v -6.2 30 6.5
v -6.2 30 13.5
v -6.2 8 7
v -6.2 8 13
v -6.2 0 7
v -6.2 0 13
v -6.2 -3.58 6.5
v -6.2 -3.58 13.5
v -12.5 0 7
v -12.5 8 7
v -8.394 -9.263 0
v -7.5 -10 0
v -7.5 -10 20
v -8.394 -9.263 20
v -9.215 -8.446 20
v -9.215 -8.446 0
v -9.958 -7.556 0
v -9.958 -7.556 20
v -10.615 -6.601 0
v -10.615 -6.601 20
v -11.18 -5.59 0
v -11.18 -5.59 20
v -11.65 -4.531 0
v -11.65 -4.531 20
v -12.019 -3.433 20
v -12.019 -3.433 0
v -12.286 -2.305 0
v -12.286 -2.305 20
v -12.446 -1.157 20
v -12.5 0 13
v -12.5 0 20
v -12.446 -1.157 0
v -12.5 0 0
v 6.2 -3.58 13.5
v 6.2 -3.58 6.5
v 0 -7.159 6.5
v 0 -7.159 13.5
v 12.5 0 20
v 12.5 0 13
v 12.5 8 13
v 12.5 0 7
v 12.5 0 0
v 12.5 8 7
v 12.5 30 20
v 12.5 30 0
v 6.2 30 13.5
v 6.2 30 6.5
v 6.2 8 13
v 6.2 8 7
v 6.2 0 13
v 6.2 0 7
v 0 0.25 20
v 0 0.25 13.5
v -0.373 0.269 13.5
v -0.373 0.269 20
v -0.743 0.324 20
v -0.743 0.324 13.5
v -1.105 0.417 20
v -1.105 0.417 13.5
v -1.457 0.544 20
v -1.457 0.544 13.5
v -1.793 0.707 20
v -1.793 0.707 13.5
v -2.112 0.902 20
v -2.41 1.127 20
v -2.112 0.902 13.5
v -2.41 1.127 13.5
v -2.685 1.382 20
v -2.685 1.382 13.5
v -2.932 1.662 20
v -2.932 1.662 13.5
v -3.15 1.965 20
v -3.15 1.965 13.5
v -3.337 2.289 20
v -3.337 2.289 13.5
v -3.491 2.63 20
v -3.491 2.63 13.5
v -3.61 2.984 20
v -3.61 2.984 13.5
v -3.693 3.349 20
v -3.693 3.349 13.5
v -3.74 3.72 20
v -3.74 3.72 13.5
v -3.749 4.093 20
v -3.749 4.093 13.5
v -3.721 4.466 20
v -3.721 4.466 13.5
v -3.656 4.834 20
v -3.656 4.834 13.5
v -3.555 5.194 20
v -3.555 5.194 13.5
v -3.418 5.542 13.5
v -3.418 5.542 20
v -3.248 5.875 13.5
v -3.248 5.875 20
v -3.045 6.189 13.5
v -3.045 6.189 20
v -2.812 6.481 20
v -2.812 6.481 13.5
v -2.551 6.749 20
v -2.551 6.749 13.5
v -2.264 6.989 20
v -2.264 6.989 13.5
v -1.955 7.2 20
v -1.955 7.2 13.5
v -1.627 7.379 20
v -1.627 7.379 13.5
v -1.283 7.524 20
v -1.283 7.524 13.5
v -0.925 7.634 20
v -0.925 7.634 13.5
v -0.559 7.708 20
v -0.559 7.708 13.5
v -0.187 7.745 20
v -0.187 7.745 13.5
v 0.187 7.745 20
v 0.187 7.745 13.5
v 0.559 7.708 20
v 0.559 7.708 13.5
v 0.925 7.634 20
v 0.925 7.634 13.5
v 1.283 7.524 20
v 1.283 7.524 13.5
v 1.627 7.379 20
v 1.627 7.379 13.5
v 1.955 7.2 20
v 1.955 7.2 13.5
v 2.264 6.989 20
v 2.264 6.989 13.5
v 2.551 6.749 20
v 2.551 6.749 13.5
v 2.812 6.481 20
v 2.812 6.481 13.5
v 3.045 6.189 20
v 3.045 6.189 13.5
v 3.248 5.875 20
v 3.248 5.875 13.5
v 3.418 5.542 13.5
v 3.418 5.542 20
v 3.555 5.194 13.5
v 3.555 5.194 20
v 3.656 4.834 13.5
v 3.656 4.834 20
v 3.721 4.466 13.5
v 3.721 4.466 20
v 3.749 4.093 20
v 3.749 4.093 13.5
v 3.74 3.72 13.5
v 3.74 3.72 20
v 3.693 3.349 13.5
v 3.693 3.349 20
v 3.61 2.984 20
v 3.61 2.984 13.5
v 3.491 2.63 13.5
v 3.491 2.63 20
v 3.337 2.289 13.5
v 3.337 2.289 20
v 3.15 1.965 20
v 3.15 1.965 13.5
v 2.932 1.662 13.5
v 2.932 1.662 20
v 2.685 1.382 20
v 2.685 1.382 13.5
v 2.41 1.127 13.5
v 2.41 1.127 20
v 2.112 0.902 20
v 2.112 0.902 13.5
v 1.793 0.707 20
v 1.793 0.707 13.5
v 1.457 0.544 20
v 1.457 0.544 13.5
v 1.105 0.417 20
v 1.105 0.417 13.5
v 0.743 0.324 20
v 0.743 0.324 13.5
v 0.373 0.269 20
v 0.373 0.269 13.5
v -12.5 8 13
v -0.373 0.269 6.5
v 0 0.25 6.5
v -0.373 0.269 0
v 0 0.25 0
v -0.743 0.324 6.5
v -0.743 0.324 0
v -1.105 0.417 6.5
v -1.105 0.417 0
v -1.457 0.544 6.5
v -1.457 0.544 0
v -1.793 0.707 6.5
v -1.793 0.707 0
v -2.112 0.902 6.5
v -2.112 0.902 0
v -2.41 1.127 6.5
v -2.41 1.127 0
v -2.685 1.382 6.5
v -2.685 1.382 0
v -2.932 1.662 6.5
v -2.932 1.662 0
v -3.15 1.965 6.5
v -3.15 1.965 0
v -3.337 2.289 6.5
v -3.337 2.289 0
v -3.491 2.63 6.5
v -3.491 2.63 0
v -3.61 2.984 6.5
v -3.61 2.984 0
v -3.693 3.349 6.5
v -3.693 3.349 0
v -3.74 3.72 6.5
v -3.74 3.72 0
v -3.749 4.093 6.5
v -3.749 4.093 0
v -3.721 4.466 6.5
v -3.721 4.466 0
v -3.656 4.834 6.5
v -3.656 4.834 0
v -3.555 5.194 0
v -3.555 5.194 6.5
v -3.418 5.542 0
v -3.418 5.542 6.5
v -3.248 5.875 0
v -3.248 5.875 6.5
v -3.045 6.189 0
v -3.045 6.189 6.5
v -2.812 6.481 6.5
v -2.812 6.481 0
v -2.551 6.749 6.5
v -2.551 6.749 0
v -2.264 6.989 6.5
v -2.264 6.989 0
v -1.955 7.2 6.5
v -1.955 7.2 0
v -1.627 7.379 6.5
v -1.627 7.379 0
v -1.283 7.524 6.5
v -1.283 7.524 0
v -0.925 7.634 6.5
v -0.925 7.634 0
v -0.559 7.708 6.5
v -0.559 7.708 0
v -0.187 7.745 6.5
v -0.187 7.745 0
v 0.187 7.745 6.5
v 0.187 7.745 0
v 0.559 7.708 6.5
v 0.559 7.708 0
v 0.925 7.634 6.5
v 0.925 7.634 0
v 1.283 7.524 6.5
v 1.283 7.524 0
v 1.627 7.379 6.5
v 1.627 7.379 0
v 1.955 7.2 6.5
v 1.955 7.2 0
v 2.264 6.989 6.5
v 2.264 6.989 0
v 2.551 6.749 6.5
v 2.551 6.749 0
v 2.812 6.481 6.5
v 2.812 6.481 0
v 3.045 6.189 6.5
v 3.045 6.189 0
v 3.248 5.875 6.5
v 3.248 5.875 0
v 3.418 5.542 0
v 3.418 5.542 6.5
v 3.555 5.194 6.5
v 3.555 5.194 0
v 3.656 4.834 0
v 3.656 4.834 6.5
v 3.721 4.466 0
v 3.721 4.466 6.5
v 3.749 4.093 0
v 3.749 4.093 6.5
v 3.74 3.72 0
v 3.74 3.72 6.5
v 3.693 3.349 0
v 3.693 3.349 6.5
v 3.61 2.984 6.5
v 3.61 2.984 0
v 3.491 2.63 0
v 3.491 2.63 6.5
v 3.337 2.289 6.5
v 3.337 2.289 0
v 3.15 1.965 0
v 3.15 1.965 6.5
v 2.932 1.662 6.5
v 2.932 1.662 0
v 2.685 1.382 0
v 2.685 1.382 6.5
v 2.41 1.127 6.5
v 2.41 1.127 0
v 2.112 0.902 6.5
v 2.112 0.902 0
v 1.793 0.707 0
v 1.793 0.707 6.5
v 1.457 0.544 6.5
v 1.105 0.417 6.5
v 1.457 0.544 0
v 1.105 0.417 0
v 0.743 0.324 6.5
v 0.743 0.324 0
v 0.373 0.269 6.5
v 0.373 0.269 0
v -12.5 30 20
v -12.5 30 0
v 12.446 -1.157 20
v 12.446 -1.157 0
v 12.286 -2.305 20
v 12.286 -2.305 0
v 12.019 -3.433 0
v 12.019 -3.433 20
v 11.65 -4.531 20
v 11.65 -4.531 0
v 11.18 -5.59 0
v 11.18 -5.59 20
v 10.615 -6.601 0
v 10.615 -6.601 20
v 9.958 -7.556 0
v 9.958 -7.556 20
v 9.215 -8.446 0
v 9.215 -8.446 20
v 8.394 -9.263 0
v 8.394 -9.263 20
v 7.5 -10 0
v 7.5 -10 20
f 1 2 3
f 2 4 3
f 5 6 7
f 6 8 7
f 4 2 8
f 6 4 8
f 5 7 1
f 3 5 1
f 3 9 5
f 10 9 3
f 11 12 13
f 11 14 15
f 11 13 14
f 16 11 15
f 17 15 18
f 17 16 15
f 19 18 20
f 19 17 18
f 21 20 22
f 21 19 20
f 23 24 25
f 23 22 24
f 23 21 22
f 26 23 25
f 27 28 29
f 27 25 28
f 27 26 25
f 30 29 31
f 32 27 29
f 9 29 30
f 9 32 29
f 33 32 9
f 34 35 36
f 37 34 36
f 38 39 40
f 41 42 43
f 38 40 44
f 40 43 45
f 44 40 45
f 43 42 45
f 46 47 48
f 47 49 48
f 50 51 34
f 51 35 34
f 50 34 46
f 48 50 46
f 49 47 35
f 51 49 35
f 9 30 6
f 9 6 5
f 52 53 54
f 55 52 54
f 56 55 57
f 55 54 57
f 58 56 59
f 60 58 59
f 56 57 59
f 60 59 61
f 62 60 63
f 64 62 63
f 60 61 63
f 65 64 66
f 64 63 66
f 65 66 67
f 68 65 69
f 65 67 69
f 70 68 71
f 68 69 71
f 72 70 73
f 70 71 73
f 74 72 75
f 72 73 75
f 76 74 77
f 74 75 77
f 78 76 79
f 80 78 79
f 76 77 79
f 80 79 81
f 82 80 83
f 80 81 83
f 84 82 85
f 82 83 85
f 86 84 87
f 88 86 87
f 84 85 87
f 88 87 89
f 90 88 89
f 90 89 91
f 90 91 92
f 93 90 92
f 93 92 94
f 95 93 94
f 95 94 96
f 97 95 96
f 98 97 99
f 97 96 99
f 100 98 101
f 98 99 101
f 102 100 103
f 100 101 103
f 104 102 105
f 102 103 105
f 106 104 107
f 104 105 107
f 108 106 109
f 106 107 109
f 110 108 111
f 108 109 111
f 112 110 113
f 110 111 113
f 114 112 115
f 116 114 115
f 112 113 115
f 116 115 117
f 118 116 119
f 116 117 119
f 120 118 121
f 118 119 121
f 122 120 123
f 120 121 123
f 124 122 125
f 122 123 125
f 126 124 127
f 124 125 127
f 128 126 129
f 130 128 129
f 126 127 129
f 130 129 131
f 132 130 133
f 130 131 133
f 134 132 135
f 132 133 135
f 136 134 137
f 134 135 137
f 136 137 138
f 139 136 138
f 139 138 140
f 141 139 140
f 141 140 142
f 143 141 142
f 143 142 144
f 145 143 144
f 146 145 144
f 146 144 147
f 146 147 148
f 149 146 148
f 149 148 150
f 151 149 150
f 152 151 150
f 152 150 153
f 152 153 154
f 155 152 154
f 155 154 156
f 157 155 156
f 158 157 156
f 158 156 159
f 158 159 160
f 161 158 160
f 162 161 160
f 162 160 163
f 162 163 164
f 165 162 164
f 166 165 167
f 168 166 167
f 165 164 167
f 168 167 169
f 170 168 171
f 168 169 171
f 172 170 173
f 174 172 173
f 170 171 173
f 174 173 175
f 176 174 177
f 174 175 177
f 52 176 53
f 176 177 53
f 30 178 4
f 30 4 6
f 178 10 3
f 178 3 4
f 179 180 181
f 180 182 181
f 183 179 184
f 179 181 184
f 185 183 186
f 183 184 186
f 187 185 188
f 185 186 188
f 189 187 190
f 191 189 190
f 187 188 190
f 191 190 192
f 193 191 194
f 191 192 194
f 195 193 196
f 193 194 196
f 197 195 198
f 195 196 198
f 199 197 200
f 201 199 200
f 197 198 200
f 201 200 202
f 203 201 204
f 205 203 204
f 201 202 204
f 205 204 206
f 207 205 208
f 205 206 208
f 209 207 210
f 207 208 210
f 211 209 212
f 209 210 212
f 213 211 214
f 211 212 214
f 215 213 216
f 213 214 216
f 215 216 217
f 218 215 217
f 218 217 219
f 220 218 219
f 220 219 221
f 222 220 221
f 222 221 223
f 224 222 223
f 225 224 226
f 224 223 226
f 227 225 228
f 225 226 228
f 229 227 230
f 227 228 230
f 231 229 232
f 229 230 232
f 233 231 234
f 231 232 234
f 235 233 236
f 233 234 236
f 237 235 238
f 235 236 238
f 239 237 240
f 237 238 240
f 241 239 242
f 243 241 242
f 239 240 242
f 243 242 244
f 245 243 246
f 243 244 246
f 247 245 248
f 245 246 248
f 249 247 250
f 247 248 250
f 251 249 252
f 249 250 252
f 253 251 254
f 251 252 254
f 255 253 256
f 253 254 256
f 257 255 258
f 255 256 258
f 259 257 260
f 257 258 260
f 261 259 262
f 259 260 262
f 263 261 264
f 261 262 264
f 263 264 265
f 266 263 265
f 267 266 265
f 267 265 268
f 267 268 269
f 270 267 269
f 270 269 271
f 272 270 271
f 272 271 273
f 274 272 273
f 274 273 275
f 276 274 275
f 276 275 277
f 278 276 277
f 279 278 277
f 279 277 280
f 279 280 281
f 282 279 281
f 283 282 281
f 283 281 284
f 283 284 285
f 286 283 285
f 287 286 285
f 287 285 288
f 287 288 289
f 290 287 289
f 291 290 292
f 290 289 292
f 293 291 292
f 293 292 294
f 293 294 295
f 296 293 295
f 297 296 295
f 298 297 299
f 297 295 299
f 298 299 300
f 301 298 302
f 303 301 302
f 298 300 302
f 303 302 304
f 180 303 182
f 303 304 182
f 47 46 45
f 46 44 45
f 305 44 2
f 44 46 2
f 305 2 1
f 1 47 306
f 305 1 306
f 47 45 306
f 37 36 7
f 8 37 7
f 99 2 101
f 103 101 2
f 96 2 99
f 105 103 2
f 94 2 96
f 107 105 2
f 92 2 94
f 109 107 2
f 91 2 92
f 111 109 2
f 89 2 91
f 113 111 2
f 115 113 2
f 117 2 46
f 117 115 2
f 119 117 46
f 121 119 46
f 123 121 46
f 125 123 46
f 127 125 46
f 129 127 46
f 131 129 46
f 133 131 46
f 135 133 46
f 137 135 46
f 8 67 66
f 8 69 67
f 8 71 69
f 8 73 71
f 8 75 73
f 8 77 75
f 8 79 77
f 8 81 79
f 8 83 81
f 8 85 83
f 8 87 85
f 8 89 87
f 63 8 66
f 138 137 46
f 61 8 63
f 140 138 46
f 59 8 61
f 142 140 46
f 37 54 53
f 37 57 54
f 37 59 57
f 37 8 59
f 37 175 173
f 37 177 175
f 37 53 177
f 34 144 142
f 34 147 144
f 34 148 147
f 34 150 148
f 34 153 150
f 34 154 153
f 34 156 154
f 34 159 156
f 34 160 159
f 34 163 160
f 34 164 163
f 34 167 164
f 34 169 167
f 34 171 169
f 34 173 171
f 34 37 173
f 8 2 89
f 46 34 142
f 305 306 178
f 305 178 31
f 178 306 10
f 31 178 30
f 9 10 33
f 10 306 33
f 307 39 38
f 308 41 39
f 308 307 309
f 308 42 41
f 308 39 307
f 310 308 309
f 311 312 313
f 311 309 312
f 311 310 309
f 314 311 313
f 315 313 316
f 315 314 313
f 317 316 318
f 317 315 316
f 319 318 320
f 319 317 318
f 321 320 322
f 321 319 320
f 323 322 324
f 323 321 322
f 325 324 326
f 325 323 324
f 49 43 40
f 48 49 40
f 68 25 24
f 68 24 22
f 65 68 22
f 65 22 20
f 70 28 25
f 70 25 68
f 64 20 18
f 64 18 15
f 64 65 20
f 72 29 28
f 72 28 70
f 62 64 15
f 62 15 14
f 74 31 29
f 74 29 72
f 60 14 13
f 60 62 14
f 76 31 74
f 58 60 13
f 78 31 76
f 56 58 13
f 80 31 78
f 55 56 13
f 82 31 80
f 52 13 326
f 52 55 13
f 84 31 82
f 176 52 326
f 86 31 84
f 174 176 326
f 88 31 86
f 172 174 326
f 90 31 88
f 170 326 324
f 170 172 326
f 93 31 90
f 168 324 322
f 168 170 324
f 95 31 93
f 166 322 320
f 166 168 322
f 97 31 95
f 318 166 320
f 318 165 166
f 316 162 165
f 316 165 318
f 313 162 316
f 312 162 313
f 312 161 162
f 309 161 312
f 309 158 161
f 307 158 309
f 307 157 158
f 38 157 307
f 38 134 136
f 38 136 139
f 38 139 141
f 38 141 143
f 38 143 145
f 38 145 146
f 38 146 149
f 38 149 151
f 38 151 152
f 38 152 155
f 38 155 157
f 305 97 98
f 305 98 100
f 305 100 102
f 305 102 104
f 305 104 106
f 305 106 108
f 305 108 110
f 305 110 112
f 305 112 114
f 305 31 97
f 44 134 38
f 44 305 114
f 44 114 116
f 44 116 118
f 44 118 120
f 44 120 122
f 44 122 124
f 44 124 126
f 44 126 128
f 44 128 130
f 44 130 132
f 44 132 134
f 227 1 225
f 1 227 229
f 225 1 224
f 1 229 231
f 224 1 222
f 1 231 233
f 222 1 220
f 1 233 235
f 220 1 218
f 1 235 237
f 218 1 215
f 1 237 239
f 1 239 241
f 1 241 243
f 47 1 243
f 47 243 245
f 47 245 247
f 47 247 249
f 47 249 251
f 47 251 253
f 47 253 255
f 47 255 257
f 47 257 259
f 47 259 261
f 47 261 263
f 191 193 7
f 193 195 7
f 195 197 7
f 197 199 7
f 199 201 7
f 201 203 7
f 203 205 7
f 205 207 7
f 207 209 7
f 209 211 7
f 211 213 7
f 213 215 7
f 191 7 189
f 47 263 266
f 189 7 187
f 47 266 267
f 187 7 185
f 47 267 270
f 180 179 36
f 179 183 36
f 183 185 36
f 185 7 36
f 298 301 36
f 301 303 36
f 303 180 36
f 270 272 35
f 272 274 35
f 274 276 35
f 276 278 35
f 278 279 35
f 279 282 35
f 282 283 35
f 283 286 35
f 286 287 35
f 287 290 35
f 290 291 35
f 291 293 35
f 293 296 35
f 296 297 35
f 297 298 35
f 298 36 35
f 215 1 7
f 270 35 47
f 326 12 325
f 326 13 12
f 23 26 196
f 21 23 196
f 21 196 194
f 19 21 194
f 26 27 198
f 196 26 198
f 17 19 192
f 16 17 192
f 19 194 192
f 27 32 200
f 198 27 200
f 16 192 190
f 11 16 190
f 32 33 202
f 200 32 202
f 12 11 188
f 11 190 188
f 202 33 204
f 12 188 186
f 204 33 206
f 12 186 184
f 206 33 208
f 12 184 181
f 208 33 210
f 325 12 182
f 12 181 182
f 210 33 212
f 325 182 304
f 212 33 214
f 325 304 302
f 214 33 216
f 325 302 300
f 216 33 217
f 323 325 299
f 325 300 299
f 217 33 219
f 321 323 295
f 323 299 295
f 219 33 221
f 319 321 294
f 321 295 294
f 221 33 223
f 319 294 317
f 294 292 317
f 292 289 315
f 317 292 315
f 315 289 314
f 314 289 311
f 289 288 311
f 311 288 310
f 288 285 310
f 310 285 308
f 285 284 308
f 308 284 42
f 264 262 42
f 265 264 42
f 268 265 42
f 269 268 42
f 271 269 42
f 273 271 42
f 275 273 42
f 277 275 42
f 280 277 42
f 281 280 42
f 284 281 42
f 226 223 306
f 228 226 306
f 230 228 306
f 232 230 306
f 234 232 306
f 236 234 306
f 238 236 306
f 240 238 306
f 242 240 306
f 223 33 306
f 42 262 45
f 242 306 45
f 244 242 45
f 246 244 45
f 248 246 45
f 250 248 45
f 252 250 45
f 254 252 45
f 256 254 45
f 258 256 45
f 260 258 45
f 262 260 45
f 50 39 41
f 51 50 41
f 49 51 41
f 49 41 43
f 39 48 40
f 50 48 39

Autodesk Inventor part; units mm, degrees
ref_plane "YZ Plane" through (0, 0, 0) normal (1, 0, 0) x (0, 1, 0)
ref_plane "XZ Plane" through (0, 0, 0) normal (0, 1, 0) x (-1, 0, 0)
sketch "Sketch1" plane through (0, 0, 0) normal (0, 0, 1) x (1, 0, 0)
  line L0 (12.5, 0) -> (12.5, 30)
  line L1 (12.5, 30) -> (-12.5, 30)
  line L2 (-12.5, 30) -> (-12.5, 0)
  arc A0 (-12.5, 0) -> (12.5, 0) centre (0, 0) ccw
  point P0 (0, 30)
  dimension "d0" = 25
  dimension "d1" = 30
  dimension "d2" = 30
  dimension "d3" = 12.5
  dimension "d4" = 12.5
  dimension "d5" = 12.5
extrude "Extrusion1" add sketch "Sketch1" along normal blind 20
ref_plane "Work Plane1" through (0, 0, 10) normal (0, 0, 1) x (1, 0, 0)
sketch "Sketch2" plane through (0, 0, 10) normal (0, 0, 1) x (1, 0, 0)
  line L0 (6.2, 3.5796) -> (6.2, -3.5796)
  line L1 (6.2, -3.5796) -> (0, -7.1591)
  line L2 (0, -7.1591) -> (-6.2, -3.5796)
  line L3 (-6.2, -3.5796) -> (-6.2, 3.5796)
  line L4 (-6.2, 3.5796) -> (0, 7.1591)
  line L5 (0, 7.1591) -> (6.2, 3.5796)
  line L6 (12.5, 30) -> (12.5, 0) projected
  line L7 (-12.5, 0) -> (-12.5, 30) projected
  line L8 (-12.5, 30) -> (12.5, 30) projected
  line L9 (12.5, 30) -> (12.5, 0) projected
  arc A0 (-12.5, 0) -> (12.5, 0) centre (0, 0) ccw projected
  dimension "d9" = 12.4
extrude "Extrusion2" cut sketch "Sketch2" along normal mid plane 7 contours L0 L1 L2 L3 L4 L5
sketch "Sketch3" plane through (0, 0, 0) normal (0, 1, 0) x (-1, 0, 0)
  point P0 (0, 0)
sketch "Sketch4" plane through (0, 0, 10) normal (0, 0, 1) x (1, 0, 0)
  point P0 (0, 0)
sketch "Sketch6" plane through (0, 0, 0) normal (0, 1, 0) x (-1, 0, 0)
  line L0 (6.2, 13.5) -> (6.2, 6.5) projected
  line L1 (0, 13.5) -> (-6.2, 13.5) projected
  line L2 (6.2, 6.5) -> (-6.2, 6.5)
  line L3 (-6.2, 6.5) -> (-6.2, 13.5)
  line L4 (-6.2, 13.5) -> (6.2, 13.5)
  line L5 (6.2, 13.5) -> (6.2, 6.5)
  point P0 (0, 0)
extrude "Extrusion3" cut sketch "Sketch6" along normal blind 30
sketch "Sketch7" plane through (0, 0, 20) normal (0, 0, 1) x (1, 0, 0)
  arc A0 (-12.5, 0) -> (12.5, 0) centre (0, 0) ccw projected
  line L0 (12.5, 30) -> (-12.5, 30) projected
  line L1 (12.5, 0) -> (12.5, 30) projected
  point P0 (0, 4)
  dimension "d27" = 26
  dimension "d28" = 12.5
hole "Hole1" at (0, 4, 20) direction (0, 0, -1) diameter 7.5 end through all
sketch "Sketch8" plane through (-12.5, 0, 0) normal (-1, 0, 0) x (0, 0, 1)
  line L0 (7, 8) -> (13, 8)
  line L1 (13, 8) -> (13, 0)
  line L2 (13, 0) -> (7, 0)
  line L3 (7, 0) -> (7, 8)
  line L4 (0, 0) -> (0, 30) projected
  dimension "d21" = 6
  dimension "d22" = 8
  dimension "d23" = 7
  dimension "d24" = 0
extrude "Extrusion4" cut sketch "Sketch8" against normal blind 25
sketch "Sketch9" plane through (0, 0, 20) normal (0, 0, 1) x (1, 0, 0)
  line L0 (-10, -10) -> (10, -10)
  line L1 (10, -10) -> (10, -15)
  line L2 (10, -15) -> (-10, -15)
  line L3 (-10, -15) -> (-10, -10)
  point P0 (0, 0)
  point P1 (0, -10)
  dimension "d29" = 10
  dimension "d30" = 5
  dimension "d31" = 20
extrude "Extrusion5" cut sketch "Sketch9" against normal blind 20
equation "\"d1\" = d2"
properties part number "Acople tuerca salida"
